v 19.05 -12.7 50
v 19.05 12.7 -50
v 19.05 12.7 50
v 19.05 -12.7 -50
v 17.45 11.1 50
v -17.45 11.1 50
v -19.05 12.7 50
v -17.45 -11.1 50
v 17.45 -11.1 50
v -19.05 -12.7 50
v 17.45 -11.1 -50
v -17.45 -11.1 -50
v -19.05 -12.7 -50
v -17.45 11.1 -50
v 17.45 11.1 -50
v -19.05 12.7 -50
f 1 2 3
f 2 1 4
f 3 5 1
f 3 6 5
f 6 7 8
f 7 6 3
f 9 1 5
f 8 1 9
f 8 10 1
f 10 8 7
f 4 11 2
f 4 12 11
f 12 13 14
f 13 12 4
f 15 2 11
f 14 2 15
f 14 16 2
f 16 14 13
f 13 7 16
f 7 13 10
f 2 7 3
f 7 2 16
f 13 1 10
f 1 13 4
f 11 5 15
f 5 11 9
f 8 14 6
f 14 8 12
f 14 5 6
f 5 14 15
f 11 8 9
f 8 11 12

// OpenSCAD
$fn=64;

module box_section_rect(outer_x=38.1, outer_y=25.4, wall=1.6, length=100) {
    inner_x = outer_x - 2*wall;
    inner_y = outer_y - 2*wall;
    difference() {
        cube([outer_x, outer_y, length], center=true);
        cube([inner_x, inner_y, length+0.2], center=true);
    }
}

box_section_rect(38.1, 25.4, 1.6, 100);
